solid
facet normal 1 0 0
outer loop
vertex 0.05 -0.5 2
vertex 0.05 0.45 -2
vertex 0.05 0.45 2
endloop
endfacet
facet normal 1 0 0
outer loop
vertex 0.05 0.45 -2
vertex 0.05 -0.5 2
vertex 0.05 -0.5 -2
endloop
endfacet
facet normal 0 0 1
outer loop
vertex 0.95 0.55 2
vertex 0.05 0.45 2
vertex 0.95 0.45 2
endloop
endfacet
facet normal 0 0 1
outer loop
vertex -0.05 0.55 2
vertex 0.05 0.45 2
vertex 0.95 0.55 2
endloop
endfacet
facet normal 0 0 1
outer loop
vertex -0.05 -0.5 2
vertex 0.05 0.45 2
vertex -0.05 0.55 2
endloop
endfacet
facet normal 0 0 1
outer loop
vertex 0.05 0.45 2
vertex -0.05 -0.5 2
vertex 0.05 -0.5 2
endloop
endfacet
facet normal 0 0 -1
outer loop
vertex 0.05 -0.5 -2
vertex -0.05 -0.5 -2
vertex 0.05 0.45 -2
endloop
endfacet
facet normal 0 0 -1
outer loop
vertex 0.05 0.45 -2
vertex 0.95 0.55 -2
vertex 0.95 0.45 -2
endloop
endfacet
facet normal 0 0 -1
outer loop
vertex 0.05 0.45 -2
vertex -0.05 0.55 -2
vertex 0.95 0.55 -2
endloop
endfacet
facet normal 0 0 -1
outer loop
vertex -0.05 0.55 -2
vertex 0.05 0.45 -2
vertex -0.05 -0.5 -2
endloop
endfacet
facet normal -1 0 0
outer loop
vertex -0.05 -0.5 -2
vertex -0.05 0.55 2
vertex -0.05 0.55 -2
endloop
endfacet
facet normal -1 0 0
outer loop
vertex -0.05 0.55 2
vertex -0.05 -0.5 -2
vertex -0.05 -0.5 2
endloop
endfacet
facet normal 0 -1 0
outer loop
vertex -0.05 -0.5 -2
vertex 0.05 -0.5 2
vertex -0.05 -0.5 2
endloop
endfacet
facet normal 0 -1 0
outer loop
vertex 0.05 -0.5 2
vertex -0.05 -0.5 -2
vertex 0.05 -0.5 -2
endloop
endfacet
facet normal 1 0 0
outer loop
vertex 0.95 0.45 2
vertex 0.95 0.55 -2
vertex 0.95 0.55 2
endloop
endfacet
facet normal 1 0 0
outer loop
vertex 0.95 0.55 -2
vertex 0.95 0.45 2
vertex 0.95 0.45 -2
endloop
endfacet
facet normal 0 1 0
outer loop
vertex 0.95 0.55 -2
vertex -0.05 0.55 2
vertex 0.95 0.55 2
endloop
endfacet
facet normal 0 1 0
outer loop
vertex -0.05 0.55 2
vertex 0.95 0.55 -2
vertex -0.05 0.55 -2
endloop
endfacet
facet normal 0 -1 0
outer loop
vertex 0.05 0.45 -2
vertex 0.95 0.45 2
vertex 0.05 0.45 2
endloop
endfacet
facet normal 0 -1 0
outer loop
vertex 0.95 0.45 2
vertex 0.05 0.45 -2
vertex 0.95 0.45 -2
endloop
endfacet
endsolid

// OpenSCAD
module Beam_T(){
    
    color("#CCCCCC"){
cube([0.1,1,4], center =true);

translate([0.45,0.5,0])
cube([1,0.1,4], center =true);


        }
    }

Beam_T();
